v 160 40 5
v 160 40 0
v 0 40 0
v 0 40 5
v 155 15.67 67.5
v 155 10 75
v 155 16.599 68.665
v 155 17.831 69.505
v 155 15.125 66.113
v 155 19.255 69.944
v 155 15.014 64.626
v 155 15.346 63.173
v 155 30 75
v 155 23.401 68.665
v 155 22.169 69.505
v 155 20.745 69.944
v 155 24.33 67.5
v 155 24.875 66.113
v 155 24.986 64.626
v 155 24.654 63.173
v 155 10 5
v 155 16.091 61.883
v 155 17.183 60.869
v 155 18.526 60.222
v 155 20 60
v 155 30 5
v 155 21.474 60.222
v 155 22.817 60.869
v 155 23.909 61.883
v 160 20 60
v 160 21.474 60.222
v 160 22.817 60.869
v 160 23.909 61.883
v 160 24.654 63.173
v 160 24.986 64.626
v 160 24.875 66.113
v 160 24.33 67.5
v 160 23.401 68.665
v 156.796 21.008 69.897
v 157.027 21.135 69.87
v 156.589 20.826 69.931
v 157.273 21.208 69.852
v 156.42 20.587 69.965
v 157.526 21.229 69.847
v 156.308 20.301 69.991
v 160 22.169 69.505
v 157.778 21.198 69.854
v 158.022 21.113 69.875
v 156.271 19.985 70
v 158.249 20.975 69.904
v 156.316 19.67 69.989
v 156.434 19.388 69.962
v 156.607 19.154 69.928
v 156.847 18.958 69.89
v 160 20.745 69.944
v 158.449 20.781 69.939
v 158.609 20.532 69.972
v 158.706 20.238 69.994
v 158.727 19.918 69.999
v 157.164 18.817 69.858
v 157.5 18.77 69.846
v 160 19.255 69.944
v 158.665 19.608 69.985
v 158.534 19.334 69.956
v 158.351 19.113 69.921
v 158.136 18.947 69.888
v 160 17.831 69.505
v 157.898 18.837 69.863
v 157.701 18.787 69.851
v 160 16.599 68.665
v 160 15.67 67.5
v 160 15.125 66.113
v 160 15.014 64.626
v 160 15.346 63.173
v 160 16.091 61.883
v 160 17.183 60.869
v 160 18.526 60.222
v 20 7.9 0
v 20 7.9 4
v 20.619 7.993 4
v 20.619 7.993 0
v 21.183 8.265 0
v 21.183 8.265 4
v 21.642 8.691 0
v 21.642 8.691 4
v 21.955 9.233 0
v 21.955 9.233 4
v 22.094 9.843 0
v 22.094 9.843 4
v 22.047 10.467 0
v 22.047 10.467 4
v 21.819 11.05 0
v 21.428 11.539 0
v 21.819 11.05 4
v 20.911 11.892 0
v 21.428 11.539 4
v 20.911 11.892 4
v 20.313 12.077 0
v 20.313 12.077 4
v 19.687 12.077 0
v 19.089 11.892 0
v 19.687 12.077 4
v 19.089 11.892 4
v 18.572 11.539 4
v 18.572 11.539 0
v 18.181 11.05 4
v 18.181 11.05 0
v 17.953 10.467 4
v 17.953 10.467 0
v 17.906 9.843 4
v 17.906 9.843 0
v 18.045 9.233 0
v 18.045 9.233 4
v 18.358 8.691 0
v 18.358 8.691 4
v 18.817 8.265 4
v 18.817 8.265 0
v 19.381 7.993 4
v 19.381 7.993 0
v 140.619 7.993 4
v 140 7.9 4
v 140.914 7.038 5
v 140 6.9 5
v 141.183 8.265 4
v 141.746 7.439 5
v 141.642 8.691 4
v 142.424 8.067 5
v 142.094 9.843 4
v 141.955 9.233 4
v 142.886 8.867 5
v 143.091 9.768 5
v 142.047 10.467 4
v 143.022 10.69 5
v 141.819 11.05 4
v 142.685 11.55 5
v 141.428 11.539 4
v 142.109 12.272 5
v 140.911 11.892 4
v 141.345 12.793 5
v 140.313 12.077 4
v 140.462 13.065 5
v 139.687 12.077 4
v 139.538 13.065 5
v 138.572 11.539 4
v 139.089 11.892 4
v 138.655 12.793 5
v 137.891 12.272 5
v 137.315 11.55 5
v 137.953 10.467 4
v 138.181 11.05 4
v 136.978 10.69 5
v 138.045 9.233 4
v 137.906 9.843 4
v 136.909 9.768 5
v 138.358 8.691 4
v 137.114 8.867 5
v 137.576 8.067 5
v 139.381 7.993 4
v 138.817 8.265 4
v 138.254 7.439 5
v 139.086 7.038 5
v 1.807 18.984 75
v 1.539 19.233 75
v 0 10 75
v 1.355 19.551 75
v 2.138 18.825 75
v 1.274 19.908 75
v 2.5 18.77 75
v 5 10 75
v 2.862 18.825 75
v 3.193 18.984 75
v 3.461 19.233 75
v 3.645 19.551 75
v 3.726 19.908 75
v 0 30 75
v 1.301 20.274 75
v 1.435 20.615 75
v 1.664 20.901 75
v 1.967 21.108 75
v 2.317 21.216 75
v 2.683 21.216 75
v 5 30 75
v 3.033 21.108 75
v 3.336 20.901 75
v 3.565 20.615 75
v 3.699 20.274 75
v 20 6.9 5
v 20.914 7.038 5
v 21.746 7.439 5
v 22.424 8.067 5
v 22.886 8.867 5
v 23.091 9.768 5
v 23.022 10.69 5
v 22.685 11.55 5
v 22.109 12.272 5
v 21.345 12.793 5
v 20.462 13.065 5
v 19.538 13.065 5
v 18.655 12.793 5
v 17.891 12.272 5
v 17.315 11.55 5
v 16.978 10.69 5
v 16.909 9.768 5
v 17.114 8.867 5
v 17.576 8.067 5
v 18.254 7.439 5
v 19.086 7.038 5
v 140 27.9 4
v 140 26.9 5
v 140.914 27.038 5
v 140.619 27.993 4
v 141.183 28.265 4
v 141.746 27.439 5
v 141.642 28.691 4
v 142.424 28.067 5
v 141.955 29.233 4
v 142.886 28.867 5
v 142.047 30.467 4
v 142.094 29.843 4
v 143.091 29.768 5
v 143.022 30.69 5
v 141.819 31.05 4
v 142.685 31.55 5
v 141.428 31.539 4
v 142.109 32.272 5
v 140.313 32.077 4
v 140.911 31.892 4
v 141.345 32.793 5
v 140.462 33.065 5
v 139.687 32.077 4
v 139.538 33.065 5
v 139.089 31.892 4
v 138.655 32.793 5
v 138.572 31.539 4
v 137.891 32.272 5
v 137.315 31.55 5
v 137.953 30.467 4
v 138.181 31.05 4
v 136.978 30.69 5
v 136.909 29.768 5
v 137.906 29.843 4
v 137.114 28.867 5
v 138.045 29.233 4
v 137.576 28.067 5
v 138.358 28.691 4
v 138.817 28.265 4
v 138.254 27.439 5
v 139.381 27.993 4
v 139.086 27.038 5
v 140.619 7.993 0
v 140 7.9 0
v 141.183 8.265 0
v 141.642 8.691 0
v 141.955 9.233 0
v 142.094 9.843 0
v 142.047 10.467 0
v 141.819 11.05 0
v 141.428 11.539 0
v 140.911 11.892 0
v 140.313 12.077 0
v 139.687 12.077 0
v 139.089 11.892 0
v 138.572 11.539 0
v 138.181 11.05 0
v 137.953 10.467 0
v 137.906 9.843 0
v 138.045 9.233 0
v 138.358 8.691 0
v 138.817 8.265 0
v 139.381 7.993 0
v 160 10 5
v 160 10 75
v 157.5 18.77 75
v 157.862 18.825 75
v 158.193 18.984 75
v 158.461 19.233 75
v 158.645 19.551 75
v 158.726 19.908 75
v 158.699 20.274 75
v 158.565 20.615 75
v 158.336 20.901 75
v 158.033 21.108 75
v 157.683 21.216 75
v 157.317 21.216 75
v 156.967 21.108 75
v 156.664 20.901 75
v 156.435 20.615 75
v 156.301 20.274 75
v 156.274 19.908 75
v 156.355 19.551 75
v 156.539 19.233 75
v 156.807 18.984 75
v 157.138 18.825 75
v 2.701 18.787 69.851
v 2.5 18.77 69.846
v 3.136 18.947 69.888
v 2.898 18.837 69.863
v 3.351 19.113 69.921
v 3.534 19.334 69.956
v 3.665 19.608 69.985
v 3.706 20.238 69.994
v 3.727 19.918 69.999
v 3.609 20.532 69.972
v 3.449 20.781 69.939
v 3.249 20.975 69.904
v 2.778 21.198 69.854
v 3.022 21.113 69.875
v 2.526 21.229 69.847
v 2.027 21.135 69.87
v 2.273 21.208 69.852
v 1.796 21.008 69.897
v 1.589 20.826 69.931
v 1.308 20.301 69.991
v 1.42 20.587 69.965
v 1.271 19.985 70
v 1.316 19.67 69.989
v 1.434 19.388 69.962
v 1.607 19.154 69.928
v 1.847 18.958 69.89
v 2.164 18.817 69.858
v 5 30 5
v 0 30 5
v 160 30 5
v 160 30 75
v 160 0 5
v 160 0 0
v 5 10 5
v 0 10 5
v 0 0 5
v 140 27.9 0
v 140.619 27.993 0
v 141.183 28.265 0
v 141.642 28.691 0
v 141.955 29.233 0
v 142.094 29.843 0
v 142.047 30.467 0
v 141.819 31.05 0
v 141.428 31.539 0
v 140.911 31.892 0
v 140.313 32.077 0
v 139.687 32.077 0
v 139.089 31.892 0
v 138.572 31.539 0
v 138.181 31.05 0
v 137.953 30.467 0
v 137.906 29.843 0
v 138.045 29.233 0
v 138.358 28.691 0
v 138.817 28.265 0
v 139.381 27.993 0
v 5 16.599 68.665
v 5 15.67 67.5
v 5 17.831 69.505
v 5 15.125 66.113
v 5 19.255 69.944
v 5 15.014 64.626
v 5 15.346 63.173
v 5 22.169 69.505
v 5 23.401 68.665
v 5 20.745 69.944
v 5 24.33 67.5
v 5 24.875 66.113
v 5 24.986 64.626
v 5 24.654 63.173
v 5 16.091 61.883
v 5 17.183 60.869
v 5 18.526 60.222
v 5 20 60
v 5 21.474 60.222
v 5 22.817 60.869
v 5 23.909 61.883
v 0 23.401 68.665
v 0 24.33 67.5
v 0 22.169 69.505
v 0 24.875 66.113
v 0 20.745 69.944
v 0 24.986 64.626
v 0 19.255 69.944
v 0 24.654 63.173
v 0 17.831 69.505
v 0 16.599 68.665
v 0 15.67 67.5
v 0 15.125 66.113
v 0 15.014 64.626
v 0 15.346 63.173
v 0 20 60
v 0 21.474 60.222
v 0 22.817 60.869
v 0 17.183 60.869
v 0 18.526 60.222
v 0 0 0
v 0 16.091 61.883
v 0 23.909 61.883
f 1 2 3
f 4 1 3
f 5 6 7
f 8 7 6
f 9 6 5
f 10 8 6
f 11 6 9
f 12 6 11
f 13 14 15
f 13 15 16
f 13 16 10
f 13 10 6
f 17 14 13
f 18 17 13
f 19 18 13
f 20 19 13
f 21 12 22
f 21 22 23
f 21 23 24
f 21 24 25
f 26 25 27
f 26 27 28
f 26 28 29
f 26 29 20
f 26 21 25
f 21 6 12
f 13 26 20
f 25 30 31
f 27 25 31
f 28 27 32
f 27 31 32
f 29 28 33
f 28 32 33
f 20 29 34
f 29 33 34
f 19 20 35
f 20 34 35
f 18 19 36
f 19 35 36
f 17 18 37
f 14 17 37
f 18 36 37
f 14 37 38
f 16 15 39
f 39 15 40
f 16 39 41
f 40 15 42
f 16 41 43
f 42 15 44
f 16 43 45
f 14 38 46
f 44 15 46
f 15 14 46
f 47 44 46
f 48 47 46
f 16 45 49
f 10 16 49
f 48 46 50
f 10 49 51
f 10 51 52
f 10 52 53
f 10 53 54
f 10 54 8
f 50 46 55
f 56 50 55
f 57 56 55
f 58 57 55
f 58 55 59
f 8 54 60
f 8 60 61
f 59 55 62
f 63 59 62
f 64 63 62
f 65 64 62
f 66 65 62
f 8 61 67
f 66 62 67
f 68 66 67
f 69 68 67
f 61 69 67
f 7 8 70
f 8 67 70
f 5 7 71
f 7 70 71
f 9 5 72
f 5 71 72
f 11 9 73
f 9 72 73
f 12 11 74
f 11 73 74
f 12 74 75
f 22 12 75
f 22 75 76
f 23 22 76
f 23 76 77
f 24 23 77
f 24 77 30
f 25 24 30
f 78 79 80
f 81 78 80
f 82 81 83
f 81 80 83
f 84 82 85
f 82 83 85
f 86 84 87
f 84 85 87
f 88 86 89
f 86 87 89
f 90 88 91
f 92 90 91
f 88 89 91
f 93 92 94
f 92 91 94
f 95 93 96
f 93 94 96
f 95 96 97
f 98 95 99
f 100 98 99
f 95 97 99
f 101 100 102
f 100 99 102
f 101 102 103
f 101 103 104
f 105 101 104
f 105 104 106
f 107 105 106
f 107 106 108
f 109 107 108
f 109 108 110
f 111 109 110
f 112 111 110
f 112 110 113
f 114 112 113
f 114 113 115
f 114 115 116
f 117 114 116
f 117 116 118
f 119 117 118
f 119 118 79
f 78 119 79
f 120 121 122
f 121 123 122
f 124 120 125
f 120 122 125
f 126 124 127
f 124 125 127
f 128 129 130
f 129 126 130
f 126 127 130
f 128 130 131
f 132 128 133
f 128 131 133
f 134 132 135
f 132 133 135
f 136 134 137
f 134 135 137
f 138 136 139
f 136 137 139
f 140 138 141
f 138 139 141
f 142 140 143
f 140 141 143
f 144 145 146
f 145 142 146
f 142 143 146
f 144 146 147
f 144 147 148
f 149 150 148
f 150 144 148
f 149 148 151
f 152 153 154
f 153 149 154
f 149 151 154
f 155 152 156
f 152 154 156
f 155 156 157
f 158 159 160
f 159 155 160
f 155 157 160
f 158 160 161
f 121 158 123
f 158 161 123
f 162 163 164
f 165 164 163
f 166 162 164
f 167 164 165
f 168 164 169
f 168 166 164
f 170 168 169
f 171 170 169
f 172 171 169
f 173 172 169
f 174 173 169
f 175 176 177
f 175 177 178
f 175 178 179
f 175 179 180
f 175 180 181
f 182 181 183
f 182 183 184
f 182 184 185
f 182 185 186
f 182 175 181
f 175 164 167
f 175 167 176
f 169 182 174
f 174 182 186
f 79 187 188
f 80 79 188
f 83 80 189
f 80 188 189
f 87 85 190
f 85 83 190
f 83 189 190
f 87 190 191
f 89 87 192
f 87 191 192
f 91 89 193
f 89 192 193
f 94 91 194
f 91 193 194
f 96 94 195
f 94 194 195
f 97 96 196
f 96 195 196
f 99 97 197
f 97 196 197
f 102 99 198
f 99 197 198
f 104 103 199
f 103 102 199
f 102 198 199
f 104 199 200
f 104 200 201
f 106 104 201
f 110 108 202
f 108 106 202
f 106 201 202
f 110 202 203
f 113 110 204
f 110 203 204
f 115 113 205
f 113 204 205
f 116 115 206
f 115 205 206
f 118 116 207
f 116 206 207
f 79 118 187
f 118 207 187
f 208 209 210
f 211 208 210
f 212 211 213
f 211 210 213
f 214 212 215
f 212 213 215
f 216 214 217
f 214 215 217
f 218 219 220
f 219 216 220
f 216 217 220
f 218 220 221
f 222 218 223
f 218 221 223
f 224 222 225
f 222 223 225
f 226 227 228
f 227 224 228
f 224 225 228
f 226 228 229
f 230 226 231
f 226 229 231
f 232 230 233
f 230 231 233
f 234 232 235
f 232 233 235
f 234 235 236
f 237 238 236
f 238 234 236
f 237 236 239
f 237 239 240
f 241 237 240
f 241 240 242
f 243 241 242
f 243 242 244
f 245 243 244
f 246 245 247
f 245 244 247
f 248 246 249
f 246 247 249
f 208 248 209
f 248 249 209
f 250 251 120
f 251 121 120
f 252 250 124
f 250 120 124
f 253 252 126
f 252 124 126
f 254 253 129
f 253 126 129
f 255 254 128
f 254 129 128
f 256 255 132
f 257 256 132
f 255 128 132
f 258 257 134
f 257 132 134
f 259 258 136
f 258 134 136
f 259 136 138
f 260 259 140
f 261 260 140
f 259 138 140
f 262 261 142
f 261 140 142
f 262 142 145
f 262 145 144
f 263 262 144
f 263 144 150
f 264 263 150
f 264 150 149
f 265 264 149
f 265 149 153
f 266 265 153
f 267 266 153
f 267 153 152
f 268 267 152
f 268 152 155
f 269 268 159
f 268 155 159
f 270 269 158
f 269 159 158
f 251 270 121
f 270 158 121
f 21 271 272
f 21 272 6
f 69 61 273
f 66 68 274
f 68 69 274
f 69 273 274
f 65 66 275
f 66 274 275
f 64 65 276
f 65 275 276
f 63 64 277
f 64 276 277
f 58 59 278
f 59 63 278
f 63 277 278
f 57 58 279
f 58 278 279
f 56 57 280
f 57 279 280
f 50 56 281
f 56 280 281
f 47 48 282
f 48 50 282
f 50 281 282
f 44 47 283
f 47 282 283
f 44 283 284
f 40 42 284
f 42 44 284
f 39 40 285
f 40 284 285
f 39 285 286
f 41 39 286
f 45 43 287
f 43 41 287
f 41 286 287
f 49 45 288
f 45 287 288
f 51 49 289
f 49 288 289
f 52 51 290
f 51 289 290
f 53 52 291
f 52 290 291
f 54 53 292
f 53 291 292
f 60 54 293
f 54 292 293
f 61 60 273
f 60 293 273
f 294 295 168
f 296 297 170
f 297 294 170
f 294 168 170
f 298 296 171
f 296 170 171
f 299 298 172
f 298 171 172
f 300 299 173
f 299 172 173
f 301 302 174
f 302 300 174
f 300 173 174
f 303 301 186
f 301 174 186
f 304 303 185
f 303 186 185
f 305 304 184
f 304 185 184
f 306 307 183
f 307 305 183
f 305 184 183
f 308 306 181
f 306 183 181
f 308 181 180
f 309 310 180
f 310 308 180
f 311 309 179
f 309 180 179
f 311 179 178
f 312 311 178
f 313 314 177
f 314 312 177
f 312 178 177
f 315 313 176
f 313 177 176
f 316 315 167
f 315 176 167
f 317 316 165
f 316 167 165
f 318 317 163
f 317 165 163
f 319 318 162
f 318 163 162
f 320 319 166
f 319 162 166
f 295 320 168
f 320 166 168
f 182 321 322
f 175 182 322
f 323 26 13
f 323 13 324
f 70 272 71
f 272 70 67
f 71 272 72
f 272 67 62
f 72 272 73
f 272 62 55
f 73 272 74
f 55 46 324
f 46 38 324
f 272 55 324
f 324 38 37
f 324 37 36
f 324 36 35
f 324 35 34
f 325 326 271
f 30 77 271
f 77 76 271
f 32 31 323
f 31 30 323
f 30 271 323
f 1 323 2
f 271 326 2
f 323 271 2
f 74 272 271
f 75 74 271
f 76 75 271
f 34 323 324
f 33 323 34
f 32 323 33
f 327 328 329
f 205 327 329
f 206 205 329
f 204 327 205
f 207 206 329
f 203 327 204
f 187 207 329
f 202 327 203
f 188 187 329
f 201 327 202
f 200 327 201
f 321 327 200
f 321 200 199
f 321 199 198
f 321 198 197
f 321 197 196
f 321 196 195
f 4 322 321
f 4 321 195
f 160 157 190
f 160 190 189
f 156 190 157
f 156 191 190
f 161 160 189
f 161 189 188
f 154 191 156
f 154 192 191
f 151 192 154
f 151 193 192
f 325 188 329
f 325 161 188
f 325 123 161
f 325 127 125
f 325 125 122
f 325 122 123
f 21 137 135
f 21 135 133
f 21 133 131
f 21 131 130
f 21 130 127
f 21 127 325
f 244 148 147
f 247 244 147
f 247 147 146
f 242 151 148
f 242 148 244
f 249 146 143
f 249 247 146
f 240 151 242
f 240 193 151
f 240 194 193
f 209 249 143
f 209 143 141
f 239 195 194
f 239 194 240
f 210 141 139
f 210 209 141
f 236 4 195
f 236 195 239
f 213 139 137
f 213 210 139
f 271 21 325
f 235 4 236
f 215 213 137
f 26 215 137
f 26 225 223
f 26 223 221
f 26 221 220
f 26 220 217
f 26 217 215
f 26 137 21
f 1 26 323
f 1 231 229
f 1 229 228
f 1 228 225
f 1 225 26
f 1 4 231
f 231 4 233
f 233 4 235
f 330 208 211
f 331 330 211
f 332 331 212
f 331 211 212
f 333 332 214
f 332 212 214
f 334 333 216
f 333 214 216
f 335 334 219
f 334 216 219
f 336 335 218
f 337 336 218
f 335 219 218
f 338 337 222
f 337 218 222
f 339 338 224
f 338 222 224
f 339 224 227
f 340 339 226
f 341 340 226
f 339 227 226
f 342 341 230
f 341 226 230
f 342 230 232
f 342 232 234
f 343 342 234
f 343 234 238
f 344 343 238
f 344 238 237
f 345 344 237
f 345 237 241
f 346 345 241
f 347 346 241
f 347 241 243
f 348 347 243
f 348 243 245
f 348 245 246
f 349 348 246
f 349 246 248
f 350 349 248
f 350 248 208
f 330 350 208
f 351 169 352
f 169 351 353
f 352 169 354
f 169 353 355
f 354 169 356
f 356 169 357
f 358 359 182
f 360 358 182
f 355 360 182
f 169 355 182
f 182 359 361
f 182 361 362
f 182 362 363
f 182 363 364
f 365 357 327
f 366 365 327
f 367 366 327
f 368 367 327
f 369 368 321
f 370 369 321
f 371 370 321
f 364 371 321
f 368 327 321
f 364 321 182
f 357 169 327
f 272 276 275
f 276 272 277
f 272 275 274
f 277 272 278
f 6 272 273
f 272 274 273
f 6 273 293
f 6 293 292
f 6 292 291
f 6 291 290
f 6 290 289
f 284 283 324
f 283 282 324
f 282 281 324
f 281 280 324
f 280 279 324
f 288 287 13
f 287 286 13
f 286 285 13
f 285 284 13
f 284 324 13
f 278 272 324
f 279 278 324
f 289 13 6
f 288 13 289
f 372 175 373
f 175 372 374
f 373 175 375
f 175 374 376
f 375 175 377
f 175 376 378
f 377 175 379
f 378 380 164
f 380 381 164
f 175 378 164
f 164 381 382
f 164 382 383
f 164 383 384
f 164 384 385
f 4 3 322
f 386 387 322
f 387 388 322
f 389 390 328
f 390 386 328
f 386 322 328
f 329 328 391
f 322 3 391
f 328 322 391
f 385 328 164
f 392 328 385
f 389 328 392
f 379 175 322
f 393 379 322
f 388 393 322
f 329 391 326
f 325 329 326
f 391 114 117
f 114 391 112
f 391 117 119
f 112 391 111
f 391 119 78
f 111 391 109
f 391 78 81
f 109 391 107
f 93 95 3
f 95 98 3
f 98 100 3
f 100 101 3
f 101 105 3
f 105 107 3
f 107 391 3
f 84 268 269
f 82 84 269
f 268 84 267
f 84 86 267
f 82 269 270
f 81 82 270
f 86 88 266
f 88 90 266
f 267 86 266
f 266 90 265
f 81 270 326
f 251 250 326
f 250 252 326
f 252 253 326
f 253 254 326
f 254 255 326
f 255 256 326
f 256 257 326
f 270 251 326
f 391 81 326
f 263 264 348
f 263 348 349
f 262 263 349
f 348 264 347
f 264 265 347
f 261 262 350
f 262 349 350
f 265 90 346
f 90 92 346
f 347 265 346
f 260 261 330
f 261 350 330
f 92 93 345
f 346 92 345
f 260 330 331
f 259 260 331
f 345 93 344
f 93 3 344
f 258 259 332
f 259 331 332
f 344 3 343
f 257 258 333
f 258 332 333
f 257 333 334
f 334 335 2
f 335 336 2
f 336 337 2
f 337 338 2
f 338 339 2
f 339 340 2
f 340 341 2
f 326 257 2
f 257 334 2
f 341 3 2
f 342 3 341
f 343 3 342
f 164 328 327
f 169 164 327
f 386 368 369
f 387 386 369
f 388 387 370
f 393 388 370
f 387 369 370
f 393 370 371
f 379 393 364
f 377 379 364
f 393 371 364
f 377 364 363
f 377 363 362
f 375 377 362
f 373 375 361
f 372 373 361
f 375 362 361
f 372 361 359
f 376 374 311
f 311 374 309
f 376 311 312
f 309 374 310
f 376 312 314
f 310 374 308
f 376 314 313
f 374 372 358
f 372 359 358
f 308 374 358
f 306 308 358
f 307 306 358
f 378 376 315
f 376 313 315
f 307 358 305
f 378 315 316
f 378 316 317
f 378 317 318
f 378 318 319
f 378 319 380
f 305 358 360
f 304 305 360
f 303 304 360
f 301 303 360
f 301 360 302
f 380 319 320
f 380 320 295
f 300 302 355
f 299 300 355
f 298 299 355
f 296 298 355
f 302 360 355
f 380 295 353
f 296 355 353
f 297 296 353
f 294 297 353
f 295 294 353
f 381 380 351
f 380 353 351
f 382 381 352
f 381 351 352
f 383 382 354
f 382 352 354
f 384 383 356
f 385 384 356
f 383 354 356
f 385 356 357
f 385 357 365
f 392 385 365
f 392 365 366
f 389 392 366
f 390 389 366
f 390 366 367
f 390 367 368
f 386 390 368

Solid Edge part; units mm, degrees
sketch "Sketch1" plane through (0, 0, 0) normal (0, 0, 1) x (1, 0, 0)
  line L0 (160, 0) -> (160, 40)
  line L1 (160, 40) -> (0, 40)
  line L2 (0, 40) -> (0, 0)
  line L3 (0, 0) -> (160, 0)
extrude "Protrusion1" add sketch "Sketch1" along normal blind 5
sketch "Sketch2" plane through (75, 20, 5) normal (0, 0, 1) x (1, 0, 0)
  line L0 (80, 10) -> (85, 10)
  line L1 (85, 10) -> (85, -10)
  line L2 (85, -10) -> (80, -10)
  line L3 (80, -10) -> (80, 10)
  line L4 (-70, -10) -> (-70, 10)
  line L5 (-70, 10) -> (-75, 10)
  line L6 (-75, 10) -> (-75, -10)
  line L7 (-75, -10) -> (-70, -10)
  dimension "D1" = 5
  dimension "D2" = 10
  dimension "D3" = 10
  dimension "D4" = 20
  dimension "D5" = 10
  dimension "D6" = 20
  dimension "D7" = 10
extrude "ExtrudedProtrusion_2" add sketch "Sketch2" along normal blind 70
hole "Bohrung_1" [suppressed]
hole "Hole1" at (20, 10, 5) direction (0, 0, -1) diameter 4.2 end up to next start chamfer 1 start chamfer angle 45
hole "Hole2" at (140, 10, 5) direction (0, 0, -1) diameter 4.2 end up to next start chamfer 1 start chamfer angle 45
hole "Hole3" at (140, 30, 5) direction (0, 0, -1) diameter 4.2 end up to next start chamfer 1 start chamfer angle 45
hole "Bohrung_6" at (160, 20, 65) direction (-1, 0, 0) diameter 10 end through all
hole "Hole_7" at (157.5, 20, 75) direction (0, 0, -1) diameter 2.459 end up to next thread major 3 thread length 2
hole "Hole4" at (2.5, 20, 75) direction (0, 0, -1) diameter 2.459 end up to next thread major 3 thread length 2
